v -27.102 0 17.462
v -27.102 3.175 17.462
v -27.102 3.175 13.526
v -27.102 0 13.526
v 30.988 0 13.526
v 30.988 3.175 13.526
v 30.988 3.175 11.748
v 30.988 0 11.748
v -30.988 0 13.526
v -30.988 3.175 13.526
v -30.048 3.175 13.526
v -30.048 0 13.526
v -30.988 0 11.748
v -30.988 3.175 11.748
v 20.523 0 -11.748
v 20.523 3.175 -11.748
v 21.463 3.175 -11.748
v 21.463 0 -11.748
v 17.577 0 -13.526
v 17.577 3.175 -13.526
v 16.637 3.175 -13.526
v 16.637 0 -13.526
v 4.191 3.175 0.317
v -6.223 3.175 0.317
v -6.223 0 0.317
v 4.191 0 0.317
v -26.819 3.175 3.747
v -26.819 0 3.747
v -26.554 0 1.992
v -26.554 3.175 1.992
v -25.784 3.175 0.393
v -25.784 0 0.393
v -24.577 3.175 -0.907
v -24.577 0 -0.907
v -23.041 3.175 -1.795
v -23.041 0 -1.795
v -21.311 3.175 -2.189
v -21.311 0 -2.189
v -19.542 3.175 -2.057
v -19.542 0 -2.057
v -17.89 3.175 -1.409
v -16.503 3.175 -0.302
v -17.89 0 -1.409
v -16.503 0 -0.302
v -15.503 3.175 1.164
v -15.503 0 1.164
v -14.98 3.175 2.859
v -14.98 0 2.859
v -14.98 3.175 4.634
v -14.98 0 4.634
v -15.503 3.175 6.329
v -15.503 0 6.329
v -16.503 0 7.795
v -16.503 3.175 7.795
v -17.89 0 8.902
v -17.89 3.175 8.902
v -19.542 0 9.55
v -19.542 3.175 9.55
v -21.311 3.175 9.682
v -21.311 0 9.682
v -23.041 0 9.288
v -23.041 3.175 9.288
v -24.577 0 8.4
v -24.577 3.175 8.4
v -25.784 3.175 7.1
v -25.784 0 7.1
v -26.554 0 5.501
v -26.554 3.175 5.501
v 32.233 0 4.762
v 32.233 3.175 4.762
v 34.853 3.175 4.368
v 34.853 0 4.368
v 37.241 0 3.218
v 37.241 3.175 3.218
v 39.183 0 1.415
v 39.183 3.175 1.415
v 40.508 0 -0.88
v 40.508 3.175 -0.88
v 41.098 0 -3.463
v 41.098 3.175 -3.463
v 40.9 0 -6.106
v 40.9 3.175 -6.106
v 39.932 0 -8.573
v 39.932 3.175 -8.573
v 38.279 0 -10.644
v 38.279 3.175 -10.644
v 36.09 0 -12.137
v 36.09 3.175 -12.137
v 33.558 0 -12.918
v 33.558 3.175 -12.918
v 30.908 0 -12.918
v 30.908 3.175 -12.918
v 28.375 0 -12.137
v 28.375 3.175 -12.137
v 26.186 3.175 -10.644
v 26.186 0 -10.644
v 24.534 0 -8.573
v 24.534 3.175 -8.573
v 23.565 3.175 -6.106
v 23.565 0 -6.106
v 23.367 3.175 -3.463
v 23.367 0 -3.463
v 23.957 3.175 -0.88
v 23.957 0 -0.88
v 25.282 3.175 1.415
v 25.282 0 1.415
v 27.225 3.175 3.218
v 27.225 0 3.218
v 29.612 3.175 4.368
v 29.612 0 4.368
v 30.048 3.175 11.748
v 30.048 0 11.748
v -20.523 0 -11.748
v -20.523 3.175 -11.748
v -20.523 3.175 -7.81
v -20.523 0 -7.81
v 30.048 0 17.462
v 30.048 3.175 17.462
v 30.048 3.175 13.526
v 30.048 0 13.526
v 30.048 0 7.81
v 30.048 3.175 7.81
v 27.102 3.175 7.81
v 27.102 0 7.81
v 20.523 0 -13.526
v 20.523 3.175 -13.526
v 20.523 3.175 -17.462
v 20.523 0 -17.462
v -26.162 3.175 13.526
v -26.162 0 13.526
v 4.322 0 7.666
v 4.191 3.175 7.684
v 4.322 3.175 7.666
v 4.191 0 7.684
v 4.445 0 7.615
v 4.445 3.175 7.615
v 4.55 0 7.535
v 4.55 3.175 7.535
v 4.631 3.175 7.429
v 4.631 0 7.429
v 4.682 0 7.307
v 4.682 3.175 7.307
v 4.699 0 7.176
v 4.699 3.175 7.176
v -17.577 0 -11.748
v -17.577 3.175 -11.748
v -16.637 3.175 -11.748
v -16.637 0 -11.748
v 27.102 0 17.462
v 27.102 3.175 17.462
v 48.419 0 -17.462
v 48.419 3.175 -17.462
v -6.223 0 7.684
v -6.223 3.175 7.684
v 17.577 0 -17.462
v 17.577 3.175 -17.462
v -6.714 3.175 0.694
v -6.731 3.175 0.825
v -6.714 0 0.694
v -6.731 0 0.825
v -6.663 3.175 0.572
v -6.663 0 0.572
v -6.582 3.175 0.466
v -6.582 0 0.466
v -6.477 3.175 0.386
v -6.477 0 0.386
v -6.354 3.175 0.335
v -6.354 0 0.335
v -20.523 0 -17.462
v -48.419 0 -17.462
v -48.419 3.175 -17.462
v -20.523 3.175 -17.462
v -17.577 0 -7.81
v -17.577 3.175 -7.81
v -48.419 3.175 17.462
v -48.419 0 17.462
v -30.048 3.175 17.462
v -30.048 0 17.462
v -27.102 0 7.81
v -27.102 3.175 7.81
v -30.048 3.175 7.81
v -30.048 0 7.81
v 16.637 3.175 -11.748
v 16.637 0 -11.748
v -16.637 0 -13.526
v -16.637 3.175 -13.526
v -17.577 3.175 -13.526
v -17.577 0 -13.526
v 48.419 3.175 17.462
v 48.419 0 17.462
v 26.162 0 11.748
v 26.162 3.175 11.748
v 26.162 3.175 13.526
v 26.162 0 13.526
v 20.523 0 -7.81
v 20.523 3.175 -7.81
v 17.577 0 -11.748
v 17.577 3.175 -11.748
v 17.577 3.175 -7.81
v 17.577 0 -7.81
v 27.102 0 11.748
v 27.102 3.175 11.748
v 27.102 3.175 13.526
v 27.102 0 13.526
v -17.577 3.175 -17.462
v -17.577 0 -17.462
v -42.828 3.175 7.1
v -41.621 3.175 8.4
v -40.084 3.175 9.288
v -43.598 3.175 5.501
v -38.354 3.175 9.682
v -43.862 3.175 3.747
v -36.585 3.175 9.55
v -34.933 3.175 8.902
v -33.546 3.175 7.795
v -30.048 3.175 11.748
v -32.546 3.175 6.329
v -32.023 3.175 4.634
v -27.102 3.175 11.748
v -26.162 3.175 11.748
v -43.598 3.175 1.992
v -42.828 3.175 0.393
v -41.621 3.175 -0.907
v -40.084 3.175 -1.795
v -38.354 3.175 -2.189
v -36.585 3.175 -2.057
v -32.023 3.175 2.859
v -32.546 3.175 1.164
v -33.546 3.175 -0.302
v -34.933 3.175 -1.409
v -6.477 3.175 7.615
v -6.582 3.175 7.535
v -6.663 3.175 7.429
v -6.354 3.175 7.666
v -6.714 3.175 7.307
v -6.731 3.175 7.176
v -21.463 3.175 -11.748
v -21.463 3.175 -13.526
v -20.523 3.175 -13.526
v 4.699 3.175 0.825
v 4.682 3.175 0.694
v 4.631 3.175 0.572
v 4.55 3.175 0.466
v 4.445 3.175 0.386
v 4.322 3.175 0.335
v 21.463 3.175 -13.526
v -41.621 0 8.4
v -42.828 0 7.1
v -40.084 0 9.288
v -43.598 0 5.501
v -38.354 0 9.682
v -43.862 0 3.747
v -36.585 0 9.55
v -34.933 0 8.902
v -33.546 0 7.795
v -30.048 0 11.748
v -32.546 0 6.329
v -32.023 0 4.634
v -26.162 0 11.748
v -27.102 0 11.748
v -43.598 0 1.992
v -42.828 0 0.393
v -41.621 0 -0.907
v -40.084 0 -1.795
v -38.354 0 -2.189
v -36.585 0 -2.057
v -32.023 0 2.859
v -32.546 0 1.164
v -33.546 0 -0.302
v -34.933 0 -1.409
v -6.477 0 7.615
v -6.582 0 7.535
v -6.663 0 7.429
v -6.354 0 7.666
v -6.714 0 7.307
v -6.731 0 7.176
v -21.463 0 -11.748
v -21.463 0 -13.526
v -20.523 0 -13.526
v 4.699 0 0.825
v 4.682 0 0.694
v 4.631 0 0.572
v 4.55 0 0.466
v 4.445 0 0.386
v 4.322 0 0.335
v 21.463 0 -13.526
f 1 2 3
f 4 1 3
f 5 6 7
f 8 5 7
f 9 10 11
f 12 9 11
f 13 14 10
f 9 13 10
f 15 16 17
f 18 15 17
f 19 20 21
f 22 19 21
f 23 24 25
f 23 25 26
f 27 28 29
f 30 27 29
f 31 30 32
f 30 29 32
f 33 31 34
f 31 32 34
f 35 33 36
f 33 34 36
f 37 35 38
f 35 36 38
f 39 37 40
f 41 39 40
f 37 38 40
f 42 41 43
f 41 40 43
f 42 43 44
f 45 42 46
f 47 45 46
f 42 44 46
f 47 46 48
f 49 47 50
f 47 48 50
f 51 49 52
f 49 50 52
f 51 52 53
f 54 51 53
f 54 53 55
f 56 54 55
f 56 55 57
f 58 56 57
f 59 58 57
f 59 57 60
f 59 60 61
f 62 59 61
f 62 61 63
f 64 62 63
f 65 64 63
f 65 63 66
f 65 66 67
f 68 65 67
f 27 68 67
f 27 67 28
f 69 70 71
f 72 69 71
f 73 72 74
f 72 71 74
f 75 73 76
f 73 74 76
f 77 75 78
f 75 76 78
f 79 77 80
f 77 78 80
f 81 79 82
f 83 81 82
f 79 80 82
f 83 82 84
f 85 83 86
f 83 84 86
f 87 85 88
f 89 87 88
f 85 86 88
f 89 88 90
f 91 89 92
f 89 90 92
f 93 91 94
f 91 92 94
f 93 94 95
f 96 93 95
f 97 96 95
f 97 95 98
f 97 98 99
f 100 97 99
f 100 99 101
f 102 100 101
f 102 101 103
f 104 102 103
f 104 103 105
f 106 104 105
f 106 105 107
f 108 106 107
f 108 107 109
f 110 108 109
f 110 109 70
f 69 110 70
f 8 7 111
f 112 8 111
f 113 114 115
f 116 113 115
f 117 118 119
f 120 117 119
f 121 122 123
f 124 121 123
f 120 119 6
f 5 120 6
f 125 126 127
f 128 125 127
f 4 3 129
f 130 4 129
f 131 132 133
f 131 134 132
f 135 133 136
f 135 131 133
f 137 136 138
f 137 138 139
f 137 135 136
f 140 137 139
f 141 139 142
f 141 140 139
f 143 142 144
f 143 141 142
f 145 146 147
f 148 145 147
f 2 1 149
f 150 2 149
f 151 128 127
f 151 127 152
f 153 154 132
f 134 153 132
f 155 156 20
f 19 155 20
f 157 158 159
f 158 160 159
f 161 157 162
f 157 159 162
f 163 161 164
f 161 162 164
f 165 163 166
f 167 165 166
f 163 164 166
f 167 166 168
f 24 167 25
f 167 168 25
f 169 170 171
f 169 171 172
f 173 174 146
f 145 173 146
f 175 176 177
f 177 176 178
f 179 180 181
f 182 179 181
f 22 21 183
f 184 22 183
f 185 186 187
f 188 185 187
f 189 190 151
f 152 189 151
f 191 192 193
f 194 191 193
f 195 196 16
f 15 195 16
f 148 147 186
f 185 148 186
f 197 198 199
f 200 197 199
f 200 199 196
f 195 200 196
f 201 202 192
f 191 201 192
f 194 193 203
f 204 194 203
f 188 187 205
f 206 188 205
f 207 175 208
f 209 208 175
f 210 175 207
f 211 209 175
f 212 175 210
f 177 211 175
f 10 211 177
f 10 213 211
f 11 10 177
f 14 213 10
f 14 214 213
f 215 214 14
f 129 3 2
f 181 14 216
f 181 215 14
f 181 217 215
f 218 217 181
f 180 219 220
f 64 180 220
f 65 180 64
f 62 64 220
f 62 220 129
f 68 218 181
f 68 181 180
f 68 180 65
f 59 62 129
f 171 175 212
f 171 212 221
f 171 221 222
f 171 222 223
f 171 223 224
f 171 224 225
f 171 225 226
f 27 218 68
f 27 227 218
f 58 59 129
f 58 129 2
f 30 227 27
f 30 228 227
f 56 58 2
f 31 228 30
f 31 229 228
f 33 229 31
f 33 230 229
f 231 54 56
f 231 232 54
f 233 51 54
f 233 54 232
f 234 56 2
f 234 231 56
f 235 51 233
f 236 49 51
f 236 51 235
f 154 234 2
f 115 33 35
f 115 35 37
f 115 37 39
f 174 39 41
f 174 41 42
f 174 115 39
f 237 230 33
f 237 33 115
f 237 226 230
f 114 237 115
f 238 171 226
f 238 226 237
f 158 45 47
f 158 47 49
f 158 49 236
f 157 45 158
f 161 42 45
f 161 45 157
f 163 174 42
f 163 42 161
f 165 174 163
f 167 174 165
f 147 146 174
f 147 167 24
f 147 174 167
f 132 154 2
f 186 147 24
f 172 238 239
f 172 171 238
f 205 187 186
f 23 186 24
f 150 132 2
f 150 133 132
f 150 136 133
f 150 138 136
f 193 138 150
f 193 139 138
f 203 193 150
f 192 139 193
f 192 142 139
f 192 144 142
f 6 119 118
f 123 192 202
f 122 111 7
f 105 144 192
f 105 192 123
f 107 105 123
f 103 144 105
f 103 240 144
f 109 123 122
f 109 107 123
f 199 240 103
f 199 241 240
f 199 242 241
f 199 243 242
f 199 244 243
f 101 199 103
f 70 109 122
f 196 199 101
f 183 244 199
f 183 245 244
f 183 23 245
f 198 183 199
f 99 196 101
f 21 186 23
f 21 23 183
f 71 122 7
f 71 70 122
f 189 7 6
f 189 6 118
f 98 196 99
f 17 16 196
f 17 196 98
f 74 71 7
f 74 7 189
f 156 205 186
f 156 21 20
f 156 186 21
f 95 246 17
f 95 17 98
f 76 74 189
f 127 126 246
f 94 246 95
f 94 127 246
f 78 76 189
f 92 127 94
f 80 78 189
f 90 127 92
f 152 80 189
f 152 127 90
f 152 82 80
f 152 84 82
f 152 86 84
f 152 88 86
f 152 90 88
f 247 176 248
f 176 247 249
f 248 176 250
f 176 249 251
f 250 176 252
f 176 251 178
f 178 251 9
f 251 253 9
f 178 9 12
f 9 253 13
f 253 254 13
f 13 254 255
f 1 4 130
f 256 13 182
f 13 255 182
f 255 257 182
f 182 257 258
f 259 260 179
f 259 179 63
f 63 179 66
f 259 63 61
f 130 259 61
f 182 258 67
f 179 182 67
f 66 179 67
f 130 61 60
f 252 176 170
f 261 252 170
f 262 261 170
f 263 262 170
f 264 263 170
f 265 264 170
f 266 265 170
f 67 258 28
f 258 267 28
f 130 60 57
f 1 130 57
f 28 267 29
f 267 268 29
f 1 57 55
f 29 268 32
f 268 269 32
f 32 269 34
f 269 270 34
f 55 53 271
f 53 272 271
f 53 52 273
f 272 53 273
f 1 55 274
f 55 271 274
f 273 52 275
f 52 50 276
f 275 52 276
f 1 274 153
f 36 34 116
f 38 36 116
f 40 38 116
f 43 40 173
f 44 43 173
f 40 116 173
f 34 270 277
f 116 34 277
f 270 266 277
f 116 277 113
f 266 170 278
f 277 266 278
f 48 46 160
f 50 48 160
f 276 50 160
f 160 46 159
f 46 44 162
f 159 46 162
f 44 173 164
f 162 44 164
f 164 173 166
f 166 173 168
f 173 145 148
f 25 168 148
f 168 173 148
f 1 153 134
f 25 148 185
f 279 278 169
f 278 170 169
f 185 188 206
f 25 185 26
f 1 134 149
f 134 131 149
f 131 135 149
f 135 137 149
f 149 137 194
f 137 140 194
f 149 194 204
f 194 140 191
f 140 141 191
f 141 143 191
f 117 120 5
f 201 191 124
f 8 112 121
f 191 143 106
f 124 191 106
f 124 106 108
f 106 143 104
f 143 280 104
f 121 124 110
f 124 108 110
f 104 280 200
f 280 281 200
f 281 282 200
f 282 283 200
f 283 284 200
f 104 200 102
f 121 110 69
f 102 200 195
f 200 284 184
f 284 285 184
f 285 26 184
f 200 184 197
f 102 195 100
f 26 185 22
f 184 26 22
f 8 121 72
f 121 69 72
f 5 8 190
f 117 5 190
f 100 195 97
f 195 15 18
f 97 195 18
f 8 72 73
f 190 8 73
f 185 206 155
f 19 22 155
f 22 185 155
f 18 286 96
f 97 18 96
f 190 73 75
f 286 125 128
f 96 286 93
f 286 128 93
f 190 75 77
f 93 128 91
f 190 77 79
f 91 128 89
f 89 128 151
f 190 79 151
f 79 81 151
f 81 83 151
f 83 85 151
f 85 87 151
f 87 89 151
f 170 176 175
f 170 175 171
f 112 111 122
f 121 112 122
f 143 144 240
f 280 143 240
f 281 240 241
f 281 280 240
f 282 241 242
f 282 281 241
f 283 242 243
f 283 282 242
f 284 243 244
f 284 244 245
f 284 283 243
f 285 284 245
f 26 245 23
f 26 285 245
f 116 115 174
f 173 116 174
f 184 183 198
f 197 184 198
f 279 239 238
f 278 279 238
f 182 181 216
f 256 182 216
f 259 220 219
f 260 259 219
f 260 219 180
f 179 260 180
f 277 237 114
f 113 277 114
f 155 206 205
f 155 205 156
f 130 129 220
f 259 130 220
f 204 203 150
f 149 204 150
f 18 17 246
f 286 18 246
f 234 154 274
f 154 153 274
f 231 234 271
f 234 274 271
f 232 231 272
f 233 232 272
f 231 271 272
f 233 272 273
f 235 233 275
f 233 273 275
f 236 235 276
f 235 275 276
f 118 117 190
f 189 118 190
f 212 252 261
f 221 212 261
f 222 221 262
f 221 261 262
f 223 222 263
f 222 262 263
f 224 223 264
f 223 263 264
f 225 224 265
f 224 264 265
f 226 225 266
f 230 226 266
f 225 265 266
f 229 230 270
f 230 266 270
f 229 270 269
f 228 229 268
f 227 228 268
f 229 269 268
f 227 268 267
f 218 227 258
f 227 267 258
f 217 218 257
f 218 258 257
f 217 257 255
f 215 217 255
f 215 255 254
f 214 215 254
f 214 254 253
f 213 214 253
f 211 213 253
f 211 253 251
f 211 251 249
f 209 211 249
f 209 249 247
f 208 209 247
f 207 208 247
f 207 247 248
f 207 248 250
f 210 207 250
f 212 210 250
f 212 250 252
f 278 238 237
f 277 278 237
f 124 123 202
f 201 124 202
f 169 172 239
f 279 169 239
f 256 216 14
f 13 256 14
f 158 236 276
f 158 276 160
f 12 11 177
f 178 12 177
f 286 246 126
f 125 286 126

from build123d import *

# Parameters (mm, degrees)
SKETCH1_W                = 96.8375
SKETCH1_H                = 34.925
BOSS_EXTRUDE1_DEPTH      = 3.175
F_7_16_CLEARANCE_HOLE1_D = 11.90498
SKETCH6_W                = 11.43
SKETCH6_H                = 7.366
CUT_EXTRUDE1_DEPTH       = 52.56932114
CUT_EXTRUDE3_DEPTH       = 52.56932114
SKETCH9_R                = 8.89
CUT_EXTRUDE4_DEPTH       = 52.56932114
FILLET1_R                = 0.508


with BuildPart() as part:
    # Sketch1 → Boss-Extrude1 (new body)
    with BuildSketch(Plane(origin=(0, 0, 0), x_dir=(1, 0, 0), z_dir=(0, 1, 0))):
        Rectangle(SKETCH1_W, SKETCH1_H)
    extrude(amount=BOSS_EXTRUDE1_DEPTH)

    # 7/16 Clearance Hole1 (through all)
    with Locations(Plane(origin=(0, 3.175, 0), x_dir=(1, 0, 0), z_dir=(0, 1, 0))):
        with Locations((-37.9095, -3.7465), (-20.8661, -3.7465)):
            Hole(F_7_16_CLEARANCE_HOLE1_D / 2)

    # Sketch6 → Cut-Extrude1 (cut, through all)
    with BuildSketch(Plane(origin=(0, 3.175, 0), x_dir=(1, 0, 0), z_dir=(0, 1, 0))):
        with Locations((-1.016, -4.0005)):
            Rectangle(SKETCH6_W, SKETCH6_H)
    extrude(amount=-CUT_EXTRUDE1_DEPTH, mode=Mode.SUBTRACT)

    # Sketch8 → Cut-Extrude3 (cut, through all)
    with BuildSketch(Plane(origin=(0, 3.175, 0), x_dir=(1, 0, 0), z_dir=(0, 1, 0))):
        Polygon((27.1018, -17.4625), (30.0482, -17.4625), (30.0482, -13.5255), (30.988, -13.5255), (30.988, -11.7475), (30.0482, -11.7475), (30.0482, -7.8105), (27.1018, -7.8105), (27.1018, -11.7475), (26.162, -11.7475), (26.162, -13.5255), (27.1018, -13.5255), align=None)
        Polygon((-30.0482, -17.4625), (-27.1018, -17.4625), (-27.1018, -13.5255), (-26.162, -13.5255), (-26.162, -11.7475), (-27.1018, -11.7475), (-27.1018, -7.8105), (-30.0482, -7.8105), (-30.0482, -11.7475), (-30.988, -11.7475), (-30.988, -13.5255), (-30.0482, -13.5255), align=None)
        Polygon((17.5768, 11.7475), (17.5768, 7.8105), (20.5232, 7.8105), (20.5232, 11.7475), (21.463, 11.7475), (21.463, 13.5255), (20.5232, 13.5255), (20.5232, 17.4625), (17.5768, 17.4625), (17.5768, 13.5255), (16.637, 13.5255), (16.637, 11.7475), align=None)
        Polygon((-20.5232, 11.7475), (-20.5232, 7.8105), (-17.5768, 7.8105), (-17.5768, 11.7475), (-16.637, 11.7475), (-16.637, 13.5255), (-17.5768, 13.5255), (-17.5768, 17.4625), (-20.5232, 17.4625), (-20.5232, 13.5255), (-21.463, 13.5255), (-21.463, 11.7475), align=None)
    extrude(amount=-CUT_EXTRUDE3_DEPTH, mode=Mode.SUBTRACT)

    # Sketch9 → Cut-Extrude4 (cut, through all)
    with BuildSketch(Plane(origin=(0, 3.175, 0), x_dir=(1, 0, 0), z_dir=(0, 1, 0))):
        with Locations(Location((32.2326, 4.1275, 0), (0, 0, 270))):
            Circle(SKETCH9_R)
    extrude(amount=-CUT_EXTRUDE4_DEPTH, mode=Mode.SUBTRACT)

    # Fillet1
    fillet1_edges = [part.edges().sort_by_distance(p)[0] for p in [
        (4.699, 1.5875, 0.3175),
        (4.699, 1.5875, 7.6835),
        (-6.731, 1.5875, 7.6835),
        (-6.731, 1.5875, 0.3175),
    ]]
    fillet(fillet1_edges, radius=FILLET1_R)


solid = part.part
